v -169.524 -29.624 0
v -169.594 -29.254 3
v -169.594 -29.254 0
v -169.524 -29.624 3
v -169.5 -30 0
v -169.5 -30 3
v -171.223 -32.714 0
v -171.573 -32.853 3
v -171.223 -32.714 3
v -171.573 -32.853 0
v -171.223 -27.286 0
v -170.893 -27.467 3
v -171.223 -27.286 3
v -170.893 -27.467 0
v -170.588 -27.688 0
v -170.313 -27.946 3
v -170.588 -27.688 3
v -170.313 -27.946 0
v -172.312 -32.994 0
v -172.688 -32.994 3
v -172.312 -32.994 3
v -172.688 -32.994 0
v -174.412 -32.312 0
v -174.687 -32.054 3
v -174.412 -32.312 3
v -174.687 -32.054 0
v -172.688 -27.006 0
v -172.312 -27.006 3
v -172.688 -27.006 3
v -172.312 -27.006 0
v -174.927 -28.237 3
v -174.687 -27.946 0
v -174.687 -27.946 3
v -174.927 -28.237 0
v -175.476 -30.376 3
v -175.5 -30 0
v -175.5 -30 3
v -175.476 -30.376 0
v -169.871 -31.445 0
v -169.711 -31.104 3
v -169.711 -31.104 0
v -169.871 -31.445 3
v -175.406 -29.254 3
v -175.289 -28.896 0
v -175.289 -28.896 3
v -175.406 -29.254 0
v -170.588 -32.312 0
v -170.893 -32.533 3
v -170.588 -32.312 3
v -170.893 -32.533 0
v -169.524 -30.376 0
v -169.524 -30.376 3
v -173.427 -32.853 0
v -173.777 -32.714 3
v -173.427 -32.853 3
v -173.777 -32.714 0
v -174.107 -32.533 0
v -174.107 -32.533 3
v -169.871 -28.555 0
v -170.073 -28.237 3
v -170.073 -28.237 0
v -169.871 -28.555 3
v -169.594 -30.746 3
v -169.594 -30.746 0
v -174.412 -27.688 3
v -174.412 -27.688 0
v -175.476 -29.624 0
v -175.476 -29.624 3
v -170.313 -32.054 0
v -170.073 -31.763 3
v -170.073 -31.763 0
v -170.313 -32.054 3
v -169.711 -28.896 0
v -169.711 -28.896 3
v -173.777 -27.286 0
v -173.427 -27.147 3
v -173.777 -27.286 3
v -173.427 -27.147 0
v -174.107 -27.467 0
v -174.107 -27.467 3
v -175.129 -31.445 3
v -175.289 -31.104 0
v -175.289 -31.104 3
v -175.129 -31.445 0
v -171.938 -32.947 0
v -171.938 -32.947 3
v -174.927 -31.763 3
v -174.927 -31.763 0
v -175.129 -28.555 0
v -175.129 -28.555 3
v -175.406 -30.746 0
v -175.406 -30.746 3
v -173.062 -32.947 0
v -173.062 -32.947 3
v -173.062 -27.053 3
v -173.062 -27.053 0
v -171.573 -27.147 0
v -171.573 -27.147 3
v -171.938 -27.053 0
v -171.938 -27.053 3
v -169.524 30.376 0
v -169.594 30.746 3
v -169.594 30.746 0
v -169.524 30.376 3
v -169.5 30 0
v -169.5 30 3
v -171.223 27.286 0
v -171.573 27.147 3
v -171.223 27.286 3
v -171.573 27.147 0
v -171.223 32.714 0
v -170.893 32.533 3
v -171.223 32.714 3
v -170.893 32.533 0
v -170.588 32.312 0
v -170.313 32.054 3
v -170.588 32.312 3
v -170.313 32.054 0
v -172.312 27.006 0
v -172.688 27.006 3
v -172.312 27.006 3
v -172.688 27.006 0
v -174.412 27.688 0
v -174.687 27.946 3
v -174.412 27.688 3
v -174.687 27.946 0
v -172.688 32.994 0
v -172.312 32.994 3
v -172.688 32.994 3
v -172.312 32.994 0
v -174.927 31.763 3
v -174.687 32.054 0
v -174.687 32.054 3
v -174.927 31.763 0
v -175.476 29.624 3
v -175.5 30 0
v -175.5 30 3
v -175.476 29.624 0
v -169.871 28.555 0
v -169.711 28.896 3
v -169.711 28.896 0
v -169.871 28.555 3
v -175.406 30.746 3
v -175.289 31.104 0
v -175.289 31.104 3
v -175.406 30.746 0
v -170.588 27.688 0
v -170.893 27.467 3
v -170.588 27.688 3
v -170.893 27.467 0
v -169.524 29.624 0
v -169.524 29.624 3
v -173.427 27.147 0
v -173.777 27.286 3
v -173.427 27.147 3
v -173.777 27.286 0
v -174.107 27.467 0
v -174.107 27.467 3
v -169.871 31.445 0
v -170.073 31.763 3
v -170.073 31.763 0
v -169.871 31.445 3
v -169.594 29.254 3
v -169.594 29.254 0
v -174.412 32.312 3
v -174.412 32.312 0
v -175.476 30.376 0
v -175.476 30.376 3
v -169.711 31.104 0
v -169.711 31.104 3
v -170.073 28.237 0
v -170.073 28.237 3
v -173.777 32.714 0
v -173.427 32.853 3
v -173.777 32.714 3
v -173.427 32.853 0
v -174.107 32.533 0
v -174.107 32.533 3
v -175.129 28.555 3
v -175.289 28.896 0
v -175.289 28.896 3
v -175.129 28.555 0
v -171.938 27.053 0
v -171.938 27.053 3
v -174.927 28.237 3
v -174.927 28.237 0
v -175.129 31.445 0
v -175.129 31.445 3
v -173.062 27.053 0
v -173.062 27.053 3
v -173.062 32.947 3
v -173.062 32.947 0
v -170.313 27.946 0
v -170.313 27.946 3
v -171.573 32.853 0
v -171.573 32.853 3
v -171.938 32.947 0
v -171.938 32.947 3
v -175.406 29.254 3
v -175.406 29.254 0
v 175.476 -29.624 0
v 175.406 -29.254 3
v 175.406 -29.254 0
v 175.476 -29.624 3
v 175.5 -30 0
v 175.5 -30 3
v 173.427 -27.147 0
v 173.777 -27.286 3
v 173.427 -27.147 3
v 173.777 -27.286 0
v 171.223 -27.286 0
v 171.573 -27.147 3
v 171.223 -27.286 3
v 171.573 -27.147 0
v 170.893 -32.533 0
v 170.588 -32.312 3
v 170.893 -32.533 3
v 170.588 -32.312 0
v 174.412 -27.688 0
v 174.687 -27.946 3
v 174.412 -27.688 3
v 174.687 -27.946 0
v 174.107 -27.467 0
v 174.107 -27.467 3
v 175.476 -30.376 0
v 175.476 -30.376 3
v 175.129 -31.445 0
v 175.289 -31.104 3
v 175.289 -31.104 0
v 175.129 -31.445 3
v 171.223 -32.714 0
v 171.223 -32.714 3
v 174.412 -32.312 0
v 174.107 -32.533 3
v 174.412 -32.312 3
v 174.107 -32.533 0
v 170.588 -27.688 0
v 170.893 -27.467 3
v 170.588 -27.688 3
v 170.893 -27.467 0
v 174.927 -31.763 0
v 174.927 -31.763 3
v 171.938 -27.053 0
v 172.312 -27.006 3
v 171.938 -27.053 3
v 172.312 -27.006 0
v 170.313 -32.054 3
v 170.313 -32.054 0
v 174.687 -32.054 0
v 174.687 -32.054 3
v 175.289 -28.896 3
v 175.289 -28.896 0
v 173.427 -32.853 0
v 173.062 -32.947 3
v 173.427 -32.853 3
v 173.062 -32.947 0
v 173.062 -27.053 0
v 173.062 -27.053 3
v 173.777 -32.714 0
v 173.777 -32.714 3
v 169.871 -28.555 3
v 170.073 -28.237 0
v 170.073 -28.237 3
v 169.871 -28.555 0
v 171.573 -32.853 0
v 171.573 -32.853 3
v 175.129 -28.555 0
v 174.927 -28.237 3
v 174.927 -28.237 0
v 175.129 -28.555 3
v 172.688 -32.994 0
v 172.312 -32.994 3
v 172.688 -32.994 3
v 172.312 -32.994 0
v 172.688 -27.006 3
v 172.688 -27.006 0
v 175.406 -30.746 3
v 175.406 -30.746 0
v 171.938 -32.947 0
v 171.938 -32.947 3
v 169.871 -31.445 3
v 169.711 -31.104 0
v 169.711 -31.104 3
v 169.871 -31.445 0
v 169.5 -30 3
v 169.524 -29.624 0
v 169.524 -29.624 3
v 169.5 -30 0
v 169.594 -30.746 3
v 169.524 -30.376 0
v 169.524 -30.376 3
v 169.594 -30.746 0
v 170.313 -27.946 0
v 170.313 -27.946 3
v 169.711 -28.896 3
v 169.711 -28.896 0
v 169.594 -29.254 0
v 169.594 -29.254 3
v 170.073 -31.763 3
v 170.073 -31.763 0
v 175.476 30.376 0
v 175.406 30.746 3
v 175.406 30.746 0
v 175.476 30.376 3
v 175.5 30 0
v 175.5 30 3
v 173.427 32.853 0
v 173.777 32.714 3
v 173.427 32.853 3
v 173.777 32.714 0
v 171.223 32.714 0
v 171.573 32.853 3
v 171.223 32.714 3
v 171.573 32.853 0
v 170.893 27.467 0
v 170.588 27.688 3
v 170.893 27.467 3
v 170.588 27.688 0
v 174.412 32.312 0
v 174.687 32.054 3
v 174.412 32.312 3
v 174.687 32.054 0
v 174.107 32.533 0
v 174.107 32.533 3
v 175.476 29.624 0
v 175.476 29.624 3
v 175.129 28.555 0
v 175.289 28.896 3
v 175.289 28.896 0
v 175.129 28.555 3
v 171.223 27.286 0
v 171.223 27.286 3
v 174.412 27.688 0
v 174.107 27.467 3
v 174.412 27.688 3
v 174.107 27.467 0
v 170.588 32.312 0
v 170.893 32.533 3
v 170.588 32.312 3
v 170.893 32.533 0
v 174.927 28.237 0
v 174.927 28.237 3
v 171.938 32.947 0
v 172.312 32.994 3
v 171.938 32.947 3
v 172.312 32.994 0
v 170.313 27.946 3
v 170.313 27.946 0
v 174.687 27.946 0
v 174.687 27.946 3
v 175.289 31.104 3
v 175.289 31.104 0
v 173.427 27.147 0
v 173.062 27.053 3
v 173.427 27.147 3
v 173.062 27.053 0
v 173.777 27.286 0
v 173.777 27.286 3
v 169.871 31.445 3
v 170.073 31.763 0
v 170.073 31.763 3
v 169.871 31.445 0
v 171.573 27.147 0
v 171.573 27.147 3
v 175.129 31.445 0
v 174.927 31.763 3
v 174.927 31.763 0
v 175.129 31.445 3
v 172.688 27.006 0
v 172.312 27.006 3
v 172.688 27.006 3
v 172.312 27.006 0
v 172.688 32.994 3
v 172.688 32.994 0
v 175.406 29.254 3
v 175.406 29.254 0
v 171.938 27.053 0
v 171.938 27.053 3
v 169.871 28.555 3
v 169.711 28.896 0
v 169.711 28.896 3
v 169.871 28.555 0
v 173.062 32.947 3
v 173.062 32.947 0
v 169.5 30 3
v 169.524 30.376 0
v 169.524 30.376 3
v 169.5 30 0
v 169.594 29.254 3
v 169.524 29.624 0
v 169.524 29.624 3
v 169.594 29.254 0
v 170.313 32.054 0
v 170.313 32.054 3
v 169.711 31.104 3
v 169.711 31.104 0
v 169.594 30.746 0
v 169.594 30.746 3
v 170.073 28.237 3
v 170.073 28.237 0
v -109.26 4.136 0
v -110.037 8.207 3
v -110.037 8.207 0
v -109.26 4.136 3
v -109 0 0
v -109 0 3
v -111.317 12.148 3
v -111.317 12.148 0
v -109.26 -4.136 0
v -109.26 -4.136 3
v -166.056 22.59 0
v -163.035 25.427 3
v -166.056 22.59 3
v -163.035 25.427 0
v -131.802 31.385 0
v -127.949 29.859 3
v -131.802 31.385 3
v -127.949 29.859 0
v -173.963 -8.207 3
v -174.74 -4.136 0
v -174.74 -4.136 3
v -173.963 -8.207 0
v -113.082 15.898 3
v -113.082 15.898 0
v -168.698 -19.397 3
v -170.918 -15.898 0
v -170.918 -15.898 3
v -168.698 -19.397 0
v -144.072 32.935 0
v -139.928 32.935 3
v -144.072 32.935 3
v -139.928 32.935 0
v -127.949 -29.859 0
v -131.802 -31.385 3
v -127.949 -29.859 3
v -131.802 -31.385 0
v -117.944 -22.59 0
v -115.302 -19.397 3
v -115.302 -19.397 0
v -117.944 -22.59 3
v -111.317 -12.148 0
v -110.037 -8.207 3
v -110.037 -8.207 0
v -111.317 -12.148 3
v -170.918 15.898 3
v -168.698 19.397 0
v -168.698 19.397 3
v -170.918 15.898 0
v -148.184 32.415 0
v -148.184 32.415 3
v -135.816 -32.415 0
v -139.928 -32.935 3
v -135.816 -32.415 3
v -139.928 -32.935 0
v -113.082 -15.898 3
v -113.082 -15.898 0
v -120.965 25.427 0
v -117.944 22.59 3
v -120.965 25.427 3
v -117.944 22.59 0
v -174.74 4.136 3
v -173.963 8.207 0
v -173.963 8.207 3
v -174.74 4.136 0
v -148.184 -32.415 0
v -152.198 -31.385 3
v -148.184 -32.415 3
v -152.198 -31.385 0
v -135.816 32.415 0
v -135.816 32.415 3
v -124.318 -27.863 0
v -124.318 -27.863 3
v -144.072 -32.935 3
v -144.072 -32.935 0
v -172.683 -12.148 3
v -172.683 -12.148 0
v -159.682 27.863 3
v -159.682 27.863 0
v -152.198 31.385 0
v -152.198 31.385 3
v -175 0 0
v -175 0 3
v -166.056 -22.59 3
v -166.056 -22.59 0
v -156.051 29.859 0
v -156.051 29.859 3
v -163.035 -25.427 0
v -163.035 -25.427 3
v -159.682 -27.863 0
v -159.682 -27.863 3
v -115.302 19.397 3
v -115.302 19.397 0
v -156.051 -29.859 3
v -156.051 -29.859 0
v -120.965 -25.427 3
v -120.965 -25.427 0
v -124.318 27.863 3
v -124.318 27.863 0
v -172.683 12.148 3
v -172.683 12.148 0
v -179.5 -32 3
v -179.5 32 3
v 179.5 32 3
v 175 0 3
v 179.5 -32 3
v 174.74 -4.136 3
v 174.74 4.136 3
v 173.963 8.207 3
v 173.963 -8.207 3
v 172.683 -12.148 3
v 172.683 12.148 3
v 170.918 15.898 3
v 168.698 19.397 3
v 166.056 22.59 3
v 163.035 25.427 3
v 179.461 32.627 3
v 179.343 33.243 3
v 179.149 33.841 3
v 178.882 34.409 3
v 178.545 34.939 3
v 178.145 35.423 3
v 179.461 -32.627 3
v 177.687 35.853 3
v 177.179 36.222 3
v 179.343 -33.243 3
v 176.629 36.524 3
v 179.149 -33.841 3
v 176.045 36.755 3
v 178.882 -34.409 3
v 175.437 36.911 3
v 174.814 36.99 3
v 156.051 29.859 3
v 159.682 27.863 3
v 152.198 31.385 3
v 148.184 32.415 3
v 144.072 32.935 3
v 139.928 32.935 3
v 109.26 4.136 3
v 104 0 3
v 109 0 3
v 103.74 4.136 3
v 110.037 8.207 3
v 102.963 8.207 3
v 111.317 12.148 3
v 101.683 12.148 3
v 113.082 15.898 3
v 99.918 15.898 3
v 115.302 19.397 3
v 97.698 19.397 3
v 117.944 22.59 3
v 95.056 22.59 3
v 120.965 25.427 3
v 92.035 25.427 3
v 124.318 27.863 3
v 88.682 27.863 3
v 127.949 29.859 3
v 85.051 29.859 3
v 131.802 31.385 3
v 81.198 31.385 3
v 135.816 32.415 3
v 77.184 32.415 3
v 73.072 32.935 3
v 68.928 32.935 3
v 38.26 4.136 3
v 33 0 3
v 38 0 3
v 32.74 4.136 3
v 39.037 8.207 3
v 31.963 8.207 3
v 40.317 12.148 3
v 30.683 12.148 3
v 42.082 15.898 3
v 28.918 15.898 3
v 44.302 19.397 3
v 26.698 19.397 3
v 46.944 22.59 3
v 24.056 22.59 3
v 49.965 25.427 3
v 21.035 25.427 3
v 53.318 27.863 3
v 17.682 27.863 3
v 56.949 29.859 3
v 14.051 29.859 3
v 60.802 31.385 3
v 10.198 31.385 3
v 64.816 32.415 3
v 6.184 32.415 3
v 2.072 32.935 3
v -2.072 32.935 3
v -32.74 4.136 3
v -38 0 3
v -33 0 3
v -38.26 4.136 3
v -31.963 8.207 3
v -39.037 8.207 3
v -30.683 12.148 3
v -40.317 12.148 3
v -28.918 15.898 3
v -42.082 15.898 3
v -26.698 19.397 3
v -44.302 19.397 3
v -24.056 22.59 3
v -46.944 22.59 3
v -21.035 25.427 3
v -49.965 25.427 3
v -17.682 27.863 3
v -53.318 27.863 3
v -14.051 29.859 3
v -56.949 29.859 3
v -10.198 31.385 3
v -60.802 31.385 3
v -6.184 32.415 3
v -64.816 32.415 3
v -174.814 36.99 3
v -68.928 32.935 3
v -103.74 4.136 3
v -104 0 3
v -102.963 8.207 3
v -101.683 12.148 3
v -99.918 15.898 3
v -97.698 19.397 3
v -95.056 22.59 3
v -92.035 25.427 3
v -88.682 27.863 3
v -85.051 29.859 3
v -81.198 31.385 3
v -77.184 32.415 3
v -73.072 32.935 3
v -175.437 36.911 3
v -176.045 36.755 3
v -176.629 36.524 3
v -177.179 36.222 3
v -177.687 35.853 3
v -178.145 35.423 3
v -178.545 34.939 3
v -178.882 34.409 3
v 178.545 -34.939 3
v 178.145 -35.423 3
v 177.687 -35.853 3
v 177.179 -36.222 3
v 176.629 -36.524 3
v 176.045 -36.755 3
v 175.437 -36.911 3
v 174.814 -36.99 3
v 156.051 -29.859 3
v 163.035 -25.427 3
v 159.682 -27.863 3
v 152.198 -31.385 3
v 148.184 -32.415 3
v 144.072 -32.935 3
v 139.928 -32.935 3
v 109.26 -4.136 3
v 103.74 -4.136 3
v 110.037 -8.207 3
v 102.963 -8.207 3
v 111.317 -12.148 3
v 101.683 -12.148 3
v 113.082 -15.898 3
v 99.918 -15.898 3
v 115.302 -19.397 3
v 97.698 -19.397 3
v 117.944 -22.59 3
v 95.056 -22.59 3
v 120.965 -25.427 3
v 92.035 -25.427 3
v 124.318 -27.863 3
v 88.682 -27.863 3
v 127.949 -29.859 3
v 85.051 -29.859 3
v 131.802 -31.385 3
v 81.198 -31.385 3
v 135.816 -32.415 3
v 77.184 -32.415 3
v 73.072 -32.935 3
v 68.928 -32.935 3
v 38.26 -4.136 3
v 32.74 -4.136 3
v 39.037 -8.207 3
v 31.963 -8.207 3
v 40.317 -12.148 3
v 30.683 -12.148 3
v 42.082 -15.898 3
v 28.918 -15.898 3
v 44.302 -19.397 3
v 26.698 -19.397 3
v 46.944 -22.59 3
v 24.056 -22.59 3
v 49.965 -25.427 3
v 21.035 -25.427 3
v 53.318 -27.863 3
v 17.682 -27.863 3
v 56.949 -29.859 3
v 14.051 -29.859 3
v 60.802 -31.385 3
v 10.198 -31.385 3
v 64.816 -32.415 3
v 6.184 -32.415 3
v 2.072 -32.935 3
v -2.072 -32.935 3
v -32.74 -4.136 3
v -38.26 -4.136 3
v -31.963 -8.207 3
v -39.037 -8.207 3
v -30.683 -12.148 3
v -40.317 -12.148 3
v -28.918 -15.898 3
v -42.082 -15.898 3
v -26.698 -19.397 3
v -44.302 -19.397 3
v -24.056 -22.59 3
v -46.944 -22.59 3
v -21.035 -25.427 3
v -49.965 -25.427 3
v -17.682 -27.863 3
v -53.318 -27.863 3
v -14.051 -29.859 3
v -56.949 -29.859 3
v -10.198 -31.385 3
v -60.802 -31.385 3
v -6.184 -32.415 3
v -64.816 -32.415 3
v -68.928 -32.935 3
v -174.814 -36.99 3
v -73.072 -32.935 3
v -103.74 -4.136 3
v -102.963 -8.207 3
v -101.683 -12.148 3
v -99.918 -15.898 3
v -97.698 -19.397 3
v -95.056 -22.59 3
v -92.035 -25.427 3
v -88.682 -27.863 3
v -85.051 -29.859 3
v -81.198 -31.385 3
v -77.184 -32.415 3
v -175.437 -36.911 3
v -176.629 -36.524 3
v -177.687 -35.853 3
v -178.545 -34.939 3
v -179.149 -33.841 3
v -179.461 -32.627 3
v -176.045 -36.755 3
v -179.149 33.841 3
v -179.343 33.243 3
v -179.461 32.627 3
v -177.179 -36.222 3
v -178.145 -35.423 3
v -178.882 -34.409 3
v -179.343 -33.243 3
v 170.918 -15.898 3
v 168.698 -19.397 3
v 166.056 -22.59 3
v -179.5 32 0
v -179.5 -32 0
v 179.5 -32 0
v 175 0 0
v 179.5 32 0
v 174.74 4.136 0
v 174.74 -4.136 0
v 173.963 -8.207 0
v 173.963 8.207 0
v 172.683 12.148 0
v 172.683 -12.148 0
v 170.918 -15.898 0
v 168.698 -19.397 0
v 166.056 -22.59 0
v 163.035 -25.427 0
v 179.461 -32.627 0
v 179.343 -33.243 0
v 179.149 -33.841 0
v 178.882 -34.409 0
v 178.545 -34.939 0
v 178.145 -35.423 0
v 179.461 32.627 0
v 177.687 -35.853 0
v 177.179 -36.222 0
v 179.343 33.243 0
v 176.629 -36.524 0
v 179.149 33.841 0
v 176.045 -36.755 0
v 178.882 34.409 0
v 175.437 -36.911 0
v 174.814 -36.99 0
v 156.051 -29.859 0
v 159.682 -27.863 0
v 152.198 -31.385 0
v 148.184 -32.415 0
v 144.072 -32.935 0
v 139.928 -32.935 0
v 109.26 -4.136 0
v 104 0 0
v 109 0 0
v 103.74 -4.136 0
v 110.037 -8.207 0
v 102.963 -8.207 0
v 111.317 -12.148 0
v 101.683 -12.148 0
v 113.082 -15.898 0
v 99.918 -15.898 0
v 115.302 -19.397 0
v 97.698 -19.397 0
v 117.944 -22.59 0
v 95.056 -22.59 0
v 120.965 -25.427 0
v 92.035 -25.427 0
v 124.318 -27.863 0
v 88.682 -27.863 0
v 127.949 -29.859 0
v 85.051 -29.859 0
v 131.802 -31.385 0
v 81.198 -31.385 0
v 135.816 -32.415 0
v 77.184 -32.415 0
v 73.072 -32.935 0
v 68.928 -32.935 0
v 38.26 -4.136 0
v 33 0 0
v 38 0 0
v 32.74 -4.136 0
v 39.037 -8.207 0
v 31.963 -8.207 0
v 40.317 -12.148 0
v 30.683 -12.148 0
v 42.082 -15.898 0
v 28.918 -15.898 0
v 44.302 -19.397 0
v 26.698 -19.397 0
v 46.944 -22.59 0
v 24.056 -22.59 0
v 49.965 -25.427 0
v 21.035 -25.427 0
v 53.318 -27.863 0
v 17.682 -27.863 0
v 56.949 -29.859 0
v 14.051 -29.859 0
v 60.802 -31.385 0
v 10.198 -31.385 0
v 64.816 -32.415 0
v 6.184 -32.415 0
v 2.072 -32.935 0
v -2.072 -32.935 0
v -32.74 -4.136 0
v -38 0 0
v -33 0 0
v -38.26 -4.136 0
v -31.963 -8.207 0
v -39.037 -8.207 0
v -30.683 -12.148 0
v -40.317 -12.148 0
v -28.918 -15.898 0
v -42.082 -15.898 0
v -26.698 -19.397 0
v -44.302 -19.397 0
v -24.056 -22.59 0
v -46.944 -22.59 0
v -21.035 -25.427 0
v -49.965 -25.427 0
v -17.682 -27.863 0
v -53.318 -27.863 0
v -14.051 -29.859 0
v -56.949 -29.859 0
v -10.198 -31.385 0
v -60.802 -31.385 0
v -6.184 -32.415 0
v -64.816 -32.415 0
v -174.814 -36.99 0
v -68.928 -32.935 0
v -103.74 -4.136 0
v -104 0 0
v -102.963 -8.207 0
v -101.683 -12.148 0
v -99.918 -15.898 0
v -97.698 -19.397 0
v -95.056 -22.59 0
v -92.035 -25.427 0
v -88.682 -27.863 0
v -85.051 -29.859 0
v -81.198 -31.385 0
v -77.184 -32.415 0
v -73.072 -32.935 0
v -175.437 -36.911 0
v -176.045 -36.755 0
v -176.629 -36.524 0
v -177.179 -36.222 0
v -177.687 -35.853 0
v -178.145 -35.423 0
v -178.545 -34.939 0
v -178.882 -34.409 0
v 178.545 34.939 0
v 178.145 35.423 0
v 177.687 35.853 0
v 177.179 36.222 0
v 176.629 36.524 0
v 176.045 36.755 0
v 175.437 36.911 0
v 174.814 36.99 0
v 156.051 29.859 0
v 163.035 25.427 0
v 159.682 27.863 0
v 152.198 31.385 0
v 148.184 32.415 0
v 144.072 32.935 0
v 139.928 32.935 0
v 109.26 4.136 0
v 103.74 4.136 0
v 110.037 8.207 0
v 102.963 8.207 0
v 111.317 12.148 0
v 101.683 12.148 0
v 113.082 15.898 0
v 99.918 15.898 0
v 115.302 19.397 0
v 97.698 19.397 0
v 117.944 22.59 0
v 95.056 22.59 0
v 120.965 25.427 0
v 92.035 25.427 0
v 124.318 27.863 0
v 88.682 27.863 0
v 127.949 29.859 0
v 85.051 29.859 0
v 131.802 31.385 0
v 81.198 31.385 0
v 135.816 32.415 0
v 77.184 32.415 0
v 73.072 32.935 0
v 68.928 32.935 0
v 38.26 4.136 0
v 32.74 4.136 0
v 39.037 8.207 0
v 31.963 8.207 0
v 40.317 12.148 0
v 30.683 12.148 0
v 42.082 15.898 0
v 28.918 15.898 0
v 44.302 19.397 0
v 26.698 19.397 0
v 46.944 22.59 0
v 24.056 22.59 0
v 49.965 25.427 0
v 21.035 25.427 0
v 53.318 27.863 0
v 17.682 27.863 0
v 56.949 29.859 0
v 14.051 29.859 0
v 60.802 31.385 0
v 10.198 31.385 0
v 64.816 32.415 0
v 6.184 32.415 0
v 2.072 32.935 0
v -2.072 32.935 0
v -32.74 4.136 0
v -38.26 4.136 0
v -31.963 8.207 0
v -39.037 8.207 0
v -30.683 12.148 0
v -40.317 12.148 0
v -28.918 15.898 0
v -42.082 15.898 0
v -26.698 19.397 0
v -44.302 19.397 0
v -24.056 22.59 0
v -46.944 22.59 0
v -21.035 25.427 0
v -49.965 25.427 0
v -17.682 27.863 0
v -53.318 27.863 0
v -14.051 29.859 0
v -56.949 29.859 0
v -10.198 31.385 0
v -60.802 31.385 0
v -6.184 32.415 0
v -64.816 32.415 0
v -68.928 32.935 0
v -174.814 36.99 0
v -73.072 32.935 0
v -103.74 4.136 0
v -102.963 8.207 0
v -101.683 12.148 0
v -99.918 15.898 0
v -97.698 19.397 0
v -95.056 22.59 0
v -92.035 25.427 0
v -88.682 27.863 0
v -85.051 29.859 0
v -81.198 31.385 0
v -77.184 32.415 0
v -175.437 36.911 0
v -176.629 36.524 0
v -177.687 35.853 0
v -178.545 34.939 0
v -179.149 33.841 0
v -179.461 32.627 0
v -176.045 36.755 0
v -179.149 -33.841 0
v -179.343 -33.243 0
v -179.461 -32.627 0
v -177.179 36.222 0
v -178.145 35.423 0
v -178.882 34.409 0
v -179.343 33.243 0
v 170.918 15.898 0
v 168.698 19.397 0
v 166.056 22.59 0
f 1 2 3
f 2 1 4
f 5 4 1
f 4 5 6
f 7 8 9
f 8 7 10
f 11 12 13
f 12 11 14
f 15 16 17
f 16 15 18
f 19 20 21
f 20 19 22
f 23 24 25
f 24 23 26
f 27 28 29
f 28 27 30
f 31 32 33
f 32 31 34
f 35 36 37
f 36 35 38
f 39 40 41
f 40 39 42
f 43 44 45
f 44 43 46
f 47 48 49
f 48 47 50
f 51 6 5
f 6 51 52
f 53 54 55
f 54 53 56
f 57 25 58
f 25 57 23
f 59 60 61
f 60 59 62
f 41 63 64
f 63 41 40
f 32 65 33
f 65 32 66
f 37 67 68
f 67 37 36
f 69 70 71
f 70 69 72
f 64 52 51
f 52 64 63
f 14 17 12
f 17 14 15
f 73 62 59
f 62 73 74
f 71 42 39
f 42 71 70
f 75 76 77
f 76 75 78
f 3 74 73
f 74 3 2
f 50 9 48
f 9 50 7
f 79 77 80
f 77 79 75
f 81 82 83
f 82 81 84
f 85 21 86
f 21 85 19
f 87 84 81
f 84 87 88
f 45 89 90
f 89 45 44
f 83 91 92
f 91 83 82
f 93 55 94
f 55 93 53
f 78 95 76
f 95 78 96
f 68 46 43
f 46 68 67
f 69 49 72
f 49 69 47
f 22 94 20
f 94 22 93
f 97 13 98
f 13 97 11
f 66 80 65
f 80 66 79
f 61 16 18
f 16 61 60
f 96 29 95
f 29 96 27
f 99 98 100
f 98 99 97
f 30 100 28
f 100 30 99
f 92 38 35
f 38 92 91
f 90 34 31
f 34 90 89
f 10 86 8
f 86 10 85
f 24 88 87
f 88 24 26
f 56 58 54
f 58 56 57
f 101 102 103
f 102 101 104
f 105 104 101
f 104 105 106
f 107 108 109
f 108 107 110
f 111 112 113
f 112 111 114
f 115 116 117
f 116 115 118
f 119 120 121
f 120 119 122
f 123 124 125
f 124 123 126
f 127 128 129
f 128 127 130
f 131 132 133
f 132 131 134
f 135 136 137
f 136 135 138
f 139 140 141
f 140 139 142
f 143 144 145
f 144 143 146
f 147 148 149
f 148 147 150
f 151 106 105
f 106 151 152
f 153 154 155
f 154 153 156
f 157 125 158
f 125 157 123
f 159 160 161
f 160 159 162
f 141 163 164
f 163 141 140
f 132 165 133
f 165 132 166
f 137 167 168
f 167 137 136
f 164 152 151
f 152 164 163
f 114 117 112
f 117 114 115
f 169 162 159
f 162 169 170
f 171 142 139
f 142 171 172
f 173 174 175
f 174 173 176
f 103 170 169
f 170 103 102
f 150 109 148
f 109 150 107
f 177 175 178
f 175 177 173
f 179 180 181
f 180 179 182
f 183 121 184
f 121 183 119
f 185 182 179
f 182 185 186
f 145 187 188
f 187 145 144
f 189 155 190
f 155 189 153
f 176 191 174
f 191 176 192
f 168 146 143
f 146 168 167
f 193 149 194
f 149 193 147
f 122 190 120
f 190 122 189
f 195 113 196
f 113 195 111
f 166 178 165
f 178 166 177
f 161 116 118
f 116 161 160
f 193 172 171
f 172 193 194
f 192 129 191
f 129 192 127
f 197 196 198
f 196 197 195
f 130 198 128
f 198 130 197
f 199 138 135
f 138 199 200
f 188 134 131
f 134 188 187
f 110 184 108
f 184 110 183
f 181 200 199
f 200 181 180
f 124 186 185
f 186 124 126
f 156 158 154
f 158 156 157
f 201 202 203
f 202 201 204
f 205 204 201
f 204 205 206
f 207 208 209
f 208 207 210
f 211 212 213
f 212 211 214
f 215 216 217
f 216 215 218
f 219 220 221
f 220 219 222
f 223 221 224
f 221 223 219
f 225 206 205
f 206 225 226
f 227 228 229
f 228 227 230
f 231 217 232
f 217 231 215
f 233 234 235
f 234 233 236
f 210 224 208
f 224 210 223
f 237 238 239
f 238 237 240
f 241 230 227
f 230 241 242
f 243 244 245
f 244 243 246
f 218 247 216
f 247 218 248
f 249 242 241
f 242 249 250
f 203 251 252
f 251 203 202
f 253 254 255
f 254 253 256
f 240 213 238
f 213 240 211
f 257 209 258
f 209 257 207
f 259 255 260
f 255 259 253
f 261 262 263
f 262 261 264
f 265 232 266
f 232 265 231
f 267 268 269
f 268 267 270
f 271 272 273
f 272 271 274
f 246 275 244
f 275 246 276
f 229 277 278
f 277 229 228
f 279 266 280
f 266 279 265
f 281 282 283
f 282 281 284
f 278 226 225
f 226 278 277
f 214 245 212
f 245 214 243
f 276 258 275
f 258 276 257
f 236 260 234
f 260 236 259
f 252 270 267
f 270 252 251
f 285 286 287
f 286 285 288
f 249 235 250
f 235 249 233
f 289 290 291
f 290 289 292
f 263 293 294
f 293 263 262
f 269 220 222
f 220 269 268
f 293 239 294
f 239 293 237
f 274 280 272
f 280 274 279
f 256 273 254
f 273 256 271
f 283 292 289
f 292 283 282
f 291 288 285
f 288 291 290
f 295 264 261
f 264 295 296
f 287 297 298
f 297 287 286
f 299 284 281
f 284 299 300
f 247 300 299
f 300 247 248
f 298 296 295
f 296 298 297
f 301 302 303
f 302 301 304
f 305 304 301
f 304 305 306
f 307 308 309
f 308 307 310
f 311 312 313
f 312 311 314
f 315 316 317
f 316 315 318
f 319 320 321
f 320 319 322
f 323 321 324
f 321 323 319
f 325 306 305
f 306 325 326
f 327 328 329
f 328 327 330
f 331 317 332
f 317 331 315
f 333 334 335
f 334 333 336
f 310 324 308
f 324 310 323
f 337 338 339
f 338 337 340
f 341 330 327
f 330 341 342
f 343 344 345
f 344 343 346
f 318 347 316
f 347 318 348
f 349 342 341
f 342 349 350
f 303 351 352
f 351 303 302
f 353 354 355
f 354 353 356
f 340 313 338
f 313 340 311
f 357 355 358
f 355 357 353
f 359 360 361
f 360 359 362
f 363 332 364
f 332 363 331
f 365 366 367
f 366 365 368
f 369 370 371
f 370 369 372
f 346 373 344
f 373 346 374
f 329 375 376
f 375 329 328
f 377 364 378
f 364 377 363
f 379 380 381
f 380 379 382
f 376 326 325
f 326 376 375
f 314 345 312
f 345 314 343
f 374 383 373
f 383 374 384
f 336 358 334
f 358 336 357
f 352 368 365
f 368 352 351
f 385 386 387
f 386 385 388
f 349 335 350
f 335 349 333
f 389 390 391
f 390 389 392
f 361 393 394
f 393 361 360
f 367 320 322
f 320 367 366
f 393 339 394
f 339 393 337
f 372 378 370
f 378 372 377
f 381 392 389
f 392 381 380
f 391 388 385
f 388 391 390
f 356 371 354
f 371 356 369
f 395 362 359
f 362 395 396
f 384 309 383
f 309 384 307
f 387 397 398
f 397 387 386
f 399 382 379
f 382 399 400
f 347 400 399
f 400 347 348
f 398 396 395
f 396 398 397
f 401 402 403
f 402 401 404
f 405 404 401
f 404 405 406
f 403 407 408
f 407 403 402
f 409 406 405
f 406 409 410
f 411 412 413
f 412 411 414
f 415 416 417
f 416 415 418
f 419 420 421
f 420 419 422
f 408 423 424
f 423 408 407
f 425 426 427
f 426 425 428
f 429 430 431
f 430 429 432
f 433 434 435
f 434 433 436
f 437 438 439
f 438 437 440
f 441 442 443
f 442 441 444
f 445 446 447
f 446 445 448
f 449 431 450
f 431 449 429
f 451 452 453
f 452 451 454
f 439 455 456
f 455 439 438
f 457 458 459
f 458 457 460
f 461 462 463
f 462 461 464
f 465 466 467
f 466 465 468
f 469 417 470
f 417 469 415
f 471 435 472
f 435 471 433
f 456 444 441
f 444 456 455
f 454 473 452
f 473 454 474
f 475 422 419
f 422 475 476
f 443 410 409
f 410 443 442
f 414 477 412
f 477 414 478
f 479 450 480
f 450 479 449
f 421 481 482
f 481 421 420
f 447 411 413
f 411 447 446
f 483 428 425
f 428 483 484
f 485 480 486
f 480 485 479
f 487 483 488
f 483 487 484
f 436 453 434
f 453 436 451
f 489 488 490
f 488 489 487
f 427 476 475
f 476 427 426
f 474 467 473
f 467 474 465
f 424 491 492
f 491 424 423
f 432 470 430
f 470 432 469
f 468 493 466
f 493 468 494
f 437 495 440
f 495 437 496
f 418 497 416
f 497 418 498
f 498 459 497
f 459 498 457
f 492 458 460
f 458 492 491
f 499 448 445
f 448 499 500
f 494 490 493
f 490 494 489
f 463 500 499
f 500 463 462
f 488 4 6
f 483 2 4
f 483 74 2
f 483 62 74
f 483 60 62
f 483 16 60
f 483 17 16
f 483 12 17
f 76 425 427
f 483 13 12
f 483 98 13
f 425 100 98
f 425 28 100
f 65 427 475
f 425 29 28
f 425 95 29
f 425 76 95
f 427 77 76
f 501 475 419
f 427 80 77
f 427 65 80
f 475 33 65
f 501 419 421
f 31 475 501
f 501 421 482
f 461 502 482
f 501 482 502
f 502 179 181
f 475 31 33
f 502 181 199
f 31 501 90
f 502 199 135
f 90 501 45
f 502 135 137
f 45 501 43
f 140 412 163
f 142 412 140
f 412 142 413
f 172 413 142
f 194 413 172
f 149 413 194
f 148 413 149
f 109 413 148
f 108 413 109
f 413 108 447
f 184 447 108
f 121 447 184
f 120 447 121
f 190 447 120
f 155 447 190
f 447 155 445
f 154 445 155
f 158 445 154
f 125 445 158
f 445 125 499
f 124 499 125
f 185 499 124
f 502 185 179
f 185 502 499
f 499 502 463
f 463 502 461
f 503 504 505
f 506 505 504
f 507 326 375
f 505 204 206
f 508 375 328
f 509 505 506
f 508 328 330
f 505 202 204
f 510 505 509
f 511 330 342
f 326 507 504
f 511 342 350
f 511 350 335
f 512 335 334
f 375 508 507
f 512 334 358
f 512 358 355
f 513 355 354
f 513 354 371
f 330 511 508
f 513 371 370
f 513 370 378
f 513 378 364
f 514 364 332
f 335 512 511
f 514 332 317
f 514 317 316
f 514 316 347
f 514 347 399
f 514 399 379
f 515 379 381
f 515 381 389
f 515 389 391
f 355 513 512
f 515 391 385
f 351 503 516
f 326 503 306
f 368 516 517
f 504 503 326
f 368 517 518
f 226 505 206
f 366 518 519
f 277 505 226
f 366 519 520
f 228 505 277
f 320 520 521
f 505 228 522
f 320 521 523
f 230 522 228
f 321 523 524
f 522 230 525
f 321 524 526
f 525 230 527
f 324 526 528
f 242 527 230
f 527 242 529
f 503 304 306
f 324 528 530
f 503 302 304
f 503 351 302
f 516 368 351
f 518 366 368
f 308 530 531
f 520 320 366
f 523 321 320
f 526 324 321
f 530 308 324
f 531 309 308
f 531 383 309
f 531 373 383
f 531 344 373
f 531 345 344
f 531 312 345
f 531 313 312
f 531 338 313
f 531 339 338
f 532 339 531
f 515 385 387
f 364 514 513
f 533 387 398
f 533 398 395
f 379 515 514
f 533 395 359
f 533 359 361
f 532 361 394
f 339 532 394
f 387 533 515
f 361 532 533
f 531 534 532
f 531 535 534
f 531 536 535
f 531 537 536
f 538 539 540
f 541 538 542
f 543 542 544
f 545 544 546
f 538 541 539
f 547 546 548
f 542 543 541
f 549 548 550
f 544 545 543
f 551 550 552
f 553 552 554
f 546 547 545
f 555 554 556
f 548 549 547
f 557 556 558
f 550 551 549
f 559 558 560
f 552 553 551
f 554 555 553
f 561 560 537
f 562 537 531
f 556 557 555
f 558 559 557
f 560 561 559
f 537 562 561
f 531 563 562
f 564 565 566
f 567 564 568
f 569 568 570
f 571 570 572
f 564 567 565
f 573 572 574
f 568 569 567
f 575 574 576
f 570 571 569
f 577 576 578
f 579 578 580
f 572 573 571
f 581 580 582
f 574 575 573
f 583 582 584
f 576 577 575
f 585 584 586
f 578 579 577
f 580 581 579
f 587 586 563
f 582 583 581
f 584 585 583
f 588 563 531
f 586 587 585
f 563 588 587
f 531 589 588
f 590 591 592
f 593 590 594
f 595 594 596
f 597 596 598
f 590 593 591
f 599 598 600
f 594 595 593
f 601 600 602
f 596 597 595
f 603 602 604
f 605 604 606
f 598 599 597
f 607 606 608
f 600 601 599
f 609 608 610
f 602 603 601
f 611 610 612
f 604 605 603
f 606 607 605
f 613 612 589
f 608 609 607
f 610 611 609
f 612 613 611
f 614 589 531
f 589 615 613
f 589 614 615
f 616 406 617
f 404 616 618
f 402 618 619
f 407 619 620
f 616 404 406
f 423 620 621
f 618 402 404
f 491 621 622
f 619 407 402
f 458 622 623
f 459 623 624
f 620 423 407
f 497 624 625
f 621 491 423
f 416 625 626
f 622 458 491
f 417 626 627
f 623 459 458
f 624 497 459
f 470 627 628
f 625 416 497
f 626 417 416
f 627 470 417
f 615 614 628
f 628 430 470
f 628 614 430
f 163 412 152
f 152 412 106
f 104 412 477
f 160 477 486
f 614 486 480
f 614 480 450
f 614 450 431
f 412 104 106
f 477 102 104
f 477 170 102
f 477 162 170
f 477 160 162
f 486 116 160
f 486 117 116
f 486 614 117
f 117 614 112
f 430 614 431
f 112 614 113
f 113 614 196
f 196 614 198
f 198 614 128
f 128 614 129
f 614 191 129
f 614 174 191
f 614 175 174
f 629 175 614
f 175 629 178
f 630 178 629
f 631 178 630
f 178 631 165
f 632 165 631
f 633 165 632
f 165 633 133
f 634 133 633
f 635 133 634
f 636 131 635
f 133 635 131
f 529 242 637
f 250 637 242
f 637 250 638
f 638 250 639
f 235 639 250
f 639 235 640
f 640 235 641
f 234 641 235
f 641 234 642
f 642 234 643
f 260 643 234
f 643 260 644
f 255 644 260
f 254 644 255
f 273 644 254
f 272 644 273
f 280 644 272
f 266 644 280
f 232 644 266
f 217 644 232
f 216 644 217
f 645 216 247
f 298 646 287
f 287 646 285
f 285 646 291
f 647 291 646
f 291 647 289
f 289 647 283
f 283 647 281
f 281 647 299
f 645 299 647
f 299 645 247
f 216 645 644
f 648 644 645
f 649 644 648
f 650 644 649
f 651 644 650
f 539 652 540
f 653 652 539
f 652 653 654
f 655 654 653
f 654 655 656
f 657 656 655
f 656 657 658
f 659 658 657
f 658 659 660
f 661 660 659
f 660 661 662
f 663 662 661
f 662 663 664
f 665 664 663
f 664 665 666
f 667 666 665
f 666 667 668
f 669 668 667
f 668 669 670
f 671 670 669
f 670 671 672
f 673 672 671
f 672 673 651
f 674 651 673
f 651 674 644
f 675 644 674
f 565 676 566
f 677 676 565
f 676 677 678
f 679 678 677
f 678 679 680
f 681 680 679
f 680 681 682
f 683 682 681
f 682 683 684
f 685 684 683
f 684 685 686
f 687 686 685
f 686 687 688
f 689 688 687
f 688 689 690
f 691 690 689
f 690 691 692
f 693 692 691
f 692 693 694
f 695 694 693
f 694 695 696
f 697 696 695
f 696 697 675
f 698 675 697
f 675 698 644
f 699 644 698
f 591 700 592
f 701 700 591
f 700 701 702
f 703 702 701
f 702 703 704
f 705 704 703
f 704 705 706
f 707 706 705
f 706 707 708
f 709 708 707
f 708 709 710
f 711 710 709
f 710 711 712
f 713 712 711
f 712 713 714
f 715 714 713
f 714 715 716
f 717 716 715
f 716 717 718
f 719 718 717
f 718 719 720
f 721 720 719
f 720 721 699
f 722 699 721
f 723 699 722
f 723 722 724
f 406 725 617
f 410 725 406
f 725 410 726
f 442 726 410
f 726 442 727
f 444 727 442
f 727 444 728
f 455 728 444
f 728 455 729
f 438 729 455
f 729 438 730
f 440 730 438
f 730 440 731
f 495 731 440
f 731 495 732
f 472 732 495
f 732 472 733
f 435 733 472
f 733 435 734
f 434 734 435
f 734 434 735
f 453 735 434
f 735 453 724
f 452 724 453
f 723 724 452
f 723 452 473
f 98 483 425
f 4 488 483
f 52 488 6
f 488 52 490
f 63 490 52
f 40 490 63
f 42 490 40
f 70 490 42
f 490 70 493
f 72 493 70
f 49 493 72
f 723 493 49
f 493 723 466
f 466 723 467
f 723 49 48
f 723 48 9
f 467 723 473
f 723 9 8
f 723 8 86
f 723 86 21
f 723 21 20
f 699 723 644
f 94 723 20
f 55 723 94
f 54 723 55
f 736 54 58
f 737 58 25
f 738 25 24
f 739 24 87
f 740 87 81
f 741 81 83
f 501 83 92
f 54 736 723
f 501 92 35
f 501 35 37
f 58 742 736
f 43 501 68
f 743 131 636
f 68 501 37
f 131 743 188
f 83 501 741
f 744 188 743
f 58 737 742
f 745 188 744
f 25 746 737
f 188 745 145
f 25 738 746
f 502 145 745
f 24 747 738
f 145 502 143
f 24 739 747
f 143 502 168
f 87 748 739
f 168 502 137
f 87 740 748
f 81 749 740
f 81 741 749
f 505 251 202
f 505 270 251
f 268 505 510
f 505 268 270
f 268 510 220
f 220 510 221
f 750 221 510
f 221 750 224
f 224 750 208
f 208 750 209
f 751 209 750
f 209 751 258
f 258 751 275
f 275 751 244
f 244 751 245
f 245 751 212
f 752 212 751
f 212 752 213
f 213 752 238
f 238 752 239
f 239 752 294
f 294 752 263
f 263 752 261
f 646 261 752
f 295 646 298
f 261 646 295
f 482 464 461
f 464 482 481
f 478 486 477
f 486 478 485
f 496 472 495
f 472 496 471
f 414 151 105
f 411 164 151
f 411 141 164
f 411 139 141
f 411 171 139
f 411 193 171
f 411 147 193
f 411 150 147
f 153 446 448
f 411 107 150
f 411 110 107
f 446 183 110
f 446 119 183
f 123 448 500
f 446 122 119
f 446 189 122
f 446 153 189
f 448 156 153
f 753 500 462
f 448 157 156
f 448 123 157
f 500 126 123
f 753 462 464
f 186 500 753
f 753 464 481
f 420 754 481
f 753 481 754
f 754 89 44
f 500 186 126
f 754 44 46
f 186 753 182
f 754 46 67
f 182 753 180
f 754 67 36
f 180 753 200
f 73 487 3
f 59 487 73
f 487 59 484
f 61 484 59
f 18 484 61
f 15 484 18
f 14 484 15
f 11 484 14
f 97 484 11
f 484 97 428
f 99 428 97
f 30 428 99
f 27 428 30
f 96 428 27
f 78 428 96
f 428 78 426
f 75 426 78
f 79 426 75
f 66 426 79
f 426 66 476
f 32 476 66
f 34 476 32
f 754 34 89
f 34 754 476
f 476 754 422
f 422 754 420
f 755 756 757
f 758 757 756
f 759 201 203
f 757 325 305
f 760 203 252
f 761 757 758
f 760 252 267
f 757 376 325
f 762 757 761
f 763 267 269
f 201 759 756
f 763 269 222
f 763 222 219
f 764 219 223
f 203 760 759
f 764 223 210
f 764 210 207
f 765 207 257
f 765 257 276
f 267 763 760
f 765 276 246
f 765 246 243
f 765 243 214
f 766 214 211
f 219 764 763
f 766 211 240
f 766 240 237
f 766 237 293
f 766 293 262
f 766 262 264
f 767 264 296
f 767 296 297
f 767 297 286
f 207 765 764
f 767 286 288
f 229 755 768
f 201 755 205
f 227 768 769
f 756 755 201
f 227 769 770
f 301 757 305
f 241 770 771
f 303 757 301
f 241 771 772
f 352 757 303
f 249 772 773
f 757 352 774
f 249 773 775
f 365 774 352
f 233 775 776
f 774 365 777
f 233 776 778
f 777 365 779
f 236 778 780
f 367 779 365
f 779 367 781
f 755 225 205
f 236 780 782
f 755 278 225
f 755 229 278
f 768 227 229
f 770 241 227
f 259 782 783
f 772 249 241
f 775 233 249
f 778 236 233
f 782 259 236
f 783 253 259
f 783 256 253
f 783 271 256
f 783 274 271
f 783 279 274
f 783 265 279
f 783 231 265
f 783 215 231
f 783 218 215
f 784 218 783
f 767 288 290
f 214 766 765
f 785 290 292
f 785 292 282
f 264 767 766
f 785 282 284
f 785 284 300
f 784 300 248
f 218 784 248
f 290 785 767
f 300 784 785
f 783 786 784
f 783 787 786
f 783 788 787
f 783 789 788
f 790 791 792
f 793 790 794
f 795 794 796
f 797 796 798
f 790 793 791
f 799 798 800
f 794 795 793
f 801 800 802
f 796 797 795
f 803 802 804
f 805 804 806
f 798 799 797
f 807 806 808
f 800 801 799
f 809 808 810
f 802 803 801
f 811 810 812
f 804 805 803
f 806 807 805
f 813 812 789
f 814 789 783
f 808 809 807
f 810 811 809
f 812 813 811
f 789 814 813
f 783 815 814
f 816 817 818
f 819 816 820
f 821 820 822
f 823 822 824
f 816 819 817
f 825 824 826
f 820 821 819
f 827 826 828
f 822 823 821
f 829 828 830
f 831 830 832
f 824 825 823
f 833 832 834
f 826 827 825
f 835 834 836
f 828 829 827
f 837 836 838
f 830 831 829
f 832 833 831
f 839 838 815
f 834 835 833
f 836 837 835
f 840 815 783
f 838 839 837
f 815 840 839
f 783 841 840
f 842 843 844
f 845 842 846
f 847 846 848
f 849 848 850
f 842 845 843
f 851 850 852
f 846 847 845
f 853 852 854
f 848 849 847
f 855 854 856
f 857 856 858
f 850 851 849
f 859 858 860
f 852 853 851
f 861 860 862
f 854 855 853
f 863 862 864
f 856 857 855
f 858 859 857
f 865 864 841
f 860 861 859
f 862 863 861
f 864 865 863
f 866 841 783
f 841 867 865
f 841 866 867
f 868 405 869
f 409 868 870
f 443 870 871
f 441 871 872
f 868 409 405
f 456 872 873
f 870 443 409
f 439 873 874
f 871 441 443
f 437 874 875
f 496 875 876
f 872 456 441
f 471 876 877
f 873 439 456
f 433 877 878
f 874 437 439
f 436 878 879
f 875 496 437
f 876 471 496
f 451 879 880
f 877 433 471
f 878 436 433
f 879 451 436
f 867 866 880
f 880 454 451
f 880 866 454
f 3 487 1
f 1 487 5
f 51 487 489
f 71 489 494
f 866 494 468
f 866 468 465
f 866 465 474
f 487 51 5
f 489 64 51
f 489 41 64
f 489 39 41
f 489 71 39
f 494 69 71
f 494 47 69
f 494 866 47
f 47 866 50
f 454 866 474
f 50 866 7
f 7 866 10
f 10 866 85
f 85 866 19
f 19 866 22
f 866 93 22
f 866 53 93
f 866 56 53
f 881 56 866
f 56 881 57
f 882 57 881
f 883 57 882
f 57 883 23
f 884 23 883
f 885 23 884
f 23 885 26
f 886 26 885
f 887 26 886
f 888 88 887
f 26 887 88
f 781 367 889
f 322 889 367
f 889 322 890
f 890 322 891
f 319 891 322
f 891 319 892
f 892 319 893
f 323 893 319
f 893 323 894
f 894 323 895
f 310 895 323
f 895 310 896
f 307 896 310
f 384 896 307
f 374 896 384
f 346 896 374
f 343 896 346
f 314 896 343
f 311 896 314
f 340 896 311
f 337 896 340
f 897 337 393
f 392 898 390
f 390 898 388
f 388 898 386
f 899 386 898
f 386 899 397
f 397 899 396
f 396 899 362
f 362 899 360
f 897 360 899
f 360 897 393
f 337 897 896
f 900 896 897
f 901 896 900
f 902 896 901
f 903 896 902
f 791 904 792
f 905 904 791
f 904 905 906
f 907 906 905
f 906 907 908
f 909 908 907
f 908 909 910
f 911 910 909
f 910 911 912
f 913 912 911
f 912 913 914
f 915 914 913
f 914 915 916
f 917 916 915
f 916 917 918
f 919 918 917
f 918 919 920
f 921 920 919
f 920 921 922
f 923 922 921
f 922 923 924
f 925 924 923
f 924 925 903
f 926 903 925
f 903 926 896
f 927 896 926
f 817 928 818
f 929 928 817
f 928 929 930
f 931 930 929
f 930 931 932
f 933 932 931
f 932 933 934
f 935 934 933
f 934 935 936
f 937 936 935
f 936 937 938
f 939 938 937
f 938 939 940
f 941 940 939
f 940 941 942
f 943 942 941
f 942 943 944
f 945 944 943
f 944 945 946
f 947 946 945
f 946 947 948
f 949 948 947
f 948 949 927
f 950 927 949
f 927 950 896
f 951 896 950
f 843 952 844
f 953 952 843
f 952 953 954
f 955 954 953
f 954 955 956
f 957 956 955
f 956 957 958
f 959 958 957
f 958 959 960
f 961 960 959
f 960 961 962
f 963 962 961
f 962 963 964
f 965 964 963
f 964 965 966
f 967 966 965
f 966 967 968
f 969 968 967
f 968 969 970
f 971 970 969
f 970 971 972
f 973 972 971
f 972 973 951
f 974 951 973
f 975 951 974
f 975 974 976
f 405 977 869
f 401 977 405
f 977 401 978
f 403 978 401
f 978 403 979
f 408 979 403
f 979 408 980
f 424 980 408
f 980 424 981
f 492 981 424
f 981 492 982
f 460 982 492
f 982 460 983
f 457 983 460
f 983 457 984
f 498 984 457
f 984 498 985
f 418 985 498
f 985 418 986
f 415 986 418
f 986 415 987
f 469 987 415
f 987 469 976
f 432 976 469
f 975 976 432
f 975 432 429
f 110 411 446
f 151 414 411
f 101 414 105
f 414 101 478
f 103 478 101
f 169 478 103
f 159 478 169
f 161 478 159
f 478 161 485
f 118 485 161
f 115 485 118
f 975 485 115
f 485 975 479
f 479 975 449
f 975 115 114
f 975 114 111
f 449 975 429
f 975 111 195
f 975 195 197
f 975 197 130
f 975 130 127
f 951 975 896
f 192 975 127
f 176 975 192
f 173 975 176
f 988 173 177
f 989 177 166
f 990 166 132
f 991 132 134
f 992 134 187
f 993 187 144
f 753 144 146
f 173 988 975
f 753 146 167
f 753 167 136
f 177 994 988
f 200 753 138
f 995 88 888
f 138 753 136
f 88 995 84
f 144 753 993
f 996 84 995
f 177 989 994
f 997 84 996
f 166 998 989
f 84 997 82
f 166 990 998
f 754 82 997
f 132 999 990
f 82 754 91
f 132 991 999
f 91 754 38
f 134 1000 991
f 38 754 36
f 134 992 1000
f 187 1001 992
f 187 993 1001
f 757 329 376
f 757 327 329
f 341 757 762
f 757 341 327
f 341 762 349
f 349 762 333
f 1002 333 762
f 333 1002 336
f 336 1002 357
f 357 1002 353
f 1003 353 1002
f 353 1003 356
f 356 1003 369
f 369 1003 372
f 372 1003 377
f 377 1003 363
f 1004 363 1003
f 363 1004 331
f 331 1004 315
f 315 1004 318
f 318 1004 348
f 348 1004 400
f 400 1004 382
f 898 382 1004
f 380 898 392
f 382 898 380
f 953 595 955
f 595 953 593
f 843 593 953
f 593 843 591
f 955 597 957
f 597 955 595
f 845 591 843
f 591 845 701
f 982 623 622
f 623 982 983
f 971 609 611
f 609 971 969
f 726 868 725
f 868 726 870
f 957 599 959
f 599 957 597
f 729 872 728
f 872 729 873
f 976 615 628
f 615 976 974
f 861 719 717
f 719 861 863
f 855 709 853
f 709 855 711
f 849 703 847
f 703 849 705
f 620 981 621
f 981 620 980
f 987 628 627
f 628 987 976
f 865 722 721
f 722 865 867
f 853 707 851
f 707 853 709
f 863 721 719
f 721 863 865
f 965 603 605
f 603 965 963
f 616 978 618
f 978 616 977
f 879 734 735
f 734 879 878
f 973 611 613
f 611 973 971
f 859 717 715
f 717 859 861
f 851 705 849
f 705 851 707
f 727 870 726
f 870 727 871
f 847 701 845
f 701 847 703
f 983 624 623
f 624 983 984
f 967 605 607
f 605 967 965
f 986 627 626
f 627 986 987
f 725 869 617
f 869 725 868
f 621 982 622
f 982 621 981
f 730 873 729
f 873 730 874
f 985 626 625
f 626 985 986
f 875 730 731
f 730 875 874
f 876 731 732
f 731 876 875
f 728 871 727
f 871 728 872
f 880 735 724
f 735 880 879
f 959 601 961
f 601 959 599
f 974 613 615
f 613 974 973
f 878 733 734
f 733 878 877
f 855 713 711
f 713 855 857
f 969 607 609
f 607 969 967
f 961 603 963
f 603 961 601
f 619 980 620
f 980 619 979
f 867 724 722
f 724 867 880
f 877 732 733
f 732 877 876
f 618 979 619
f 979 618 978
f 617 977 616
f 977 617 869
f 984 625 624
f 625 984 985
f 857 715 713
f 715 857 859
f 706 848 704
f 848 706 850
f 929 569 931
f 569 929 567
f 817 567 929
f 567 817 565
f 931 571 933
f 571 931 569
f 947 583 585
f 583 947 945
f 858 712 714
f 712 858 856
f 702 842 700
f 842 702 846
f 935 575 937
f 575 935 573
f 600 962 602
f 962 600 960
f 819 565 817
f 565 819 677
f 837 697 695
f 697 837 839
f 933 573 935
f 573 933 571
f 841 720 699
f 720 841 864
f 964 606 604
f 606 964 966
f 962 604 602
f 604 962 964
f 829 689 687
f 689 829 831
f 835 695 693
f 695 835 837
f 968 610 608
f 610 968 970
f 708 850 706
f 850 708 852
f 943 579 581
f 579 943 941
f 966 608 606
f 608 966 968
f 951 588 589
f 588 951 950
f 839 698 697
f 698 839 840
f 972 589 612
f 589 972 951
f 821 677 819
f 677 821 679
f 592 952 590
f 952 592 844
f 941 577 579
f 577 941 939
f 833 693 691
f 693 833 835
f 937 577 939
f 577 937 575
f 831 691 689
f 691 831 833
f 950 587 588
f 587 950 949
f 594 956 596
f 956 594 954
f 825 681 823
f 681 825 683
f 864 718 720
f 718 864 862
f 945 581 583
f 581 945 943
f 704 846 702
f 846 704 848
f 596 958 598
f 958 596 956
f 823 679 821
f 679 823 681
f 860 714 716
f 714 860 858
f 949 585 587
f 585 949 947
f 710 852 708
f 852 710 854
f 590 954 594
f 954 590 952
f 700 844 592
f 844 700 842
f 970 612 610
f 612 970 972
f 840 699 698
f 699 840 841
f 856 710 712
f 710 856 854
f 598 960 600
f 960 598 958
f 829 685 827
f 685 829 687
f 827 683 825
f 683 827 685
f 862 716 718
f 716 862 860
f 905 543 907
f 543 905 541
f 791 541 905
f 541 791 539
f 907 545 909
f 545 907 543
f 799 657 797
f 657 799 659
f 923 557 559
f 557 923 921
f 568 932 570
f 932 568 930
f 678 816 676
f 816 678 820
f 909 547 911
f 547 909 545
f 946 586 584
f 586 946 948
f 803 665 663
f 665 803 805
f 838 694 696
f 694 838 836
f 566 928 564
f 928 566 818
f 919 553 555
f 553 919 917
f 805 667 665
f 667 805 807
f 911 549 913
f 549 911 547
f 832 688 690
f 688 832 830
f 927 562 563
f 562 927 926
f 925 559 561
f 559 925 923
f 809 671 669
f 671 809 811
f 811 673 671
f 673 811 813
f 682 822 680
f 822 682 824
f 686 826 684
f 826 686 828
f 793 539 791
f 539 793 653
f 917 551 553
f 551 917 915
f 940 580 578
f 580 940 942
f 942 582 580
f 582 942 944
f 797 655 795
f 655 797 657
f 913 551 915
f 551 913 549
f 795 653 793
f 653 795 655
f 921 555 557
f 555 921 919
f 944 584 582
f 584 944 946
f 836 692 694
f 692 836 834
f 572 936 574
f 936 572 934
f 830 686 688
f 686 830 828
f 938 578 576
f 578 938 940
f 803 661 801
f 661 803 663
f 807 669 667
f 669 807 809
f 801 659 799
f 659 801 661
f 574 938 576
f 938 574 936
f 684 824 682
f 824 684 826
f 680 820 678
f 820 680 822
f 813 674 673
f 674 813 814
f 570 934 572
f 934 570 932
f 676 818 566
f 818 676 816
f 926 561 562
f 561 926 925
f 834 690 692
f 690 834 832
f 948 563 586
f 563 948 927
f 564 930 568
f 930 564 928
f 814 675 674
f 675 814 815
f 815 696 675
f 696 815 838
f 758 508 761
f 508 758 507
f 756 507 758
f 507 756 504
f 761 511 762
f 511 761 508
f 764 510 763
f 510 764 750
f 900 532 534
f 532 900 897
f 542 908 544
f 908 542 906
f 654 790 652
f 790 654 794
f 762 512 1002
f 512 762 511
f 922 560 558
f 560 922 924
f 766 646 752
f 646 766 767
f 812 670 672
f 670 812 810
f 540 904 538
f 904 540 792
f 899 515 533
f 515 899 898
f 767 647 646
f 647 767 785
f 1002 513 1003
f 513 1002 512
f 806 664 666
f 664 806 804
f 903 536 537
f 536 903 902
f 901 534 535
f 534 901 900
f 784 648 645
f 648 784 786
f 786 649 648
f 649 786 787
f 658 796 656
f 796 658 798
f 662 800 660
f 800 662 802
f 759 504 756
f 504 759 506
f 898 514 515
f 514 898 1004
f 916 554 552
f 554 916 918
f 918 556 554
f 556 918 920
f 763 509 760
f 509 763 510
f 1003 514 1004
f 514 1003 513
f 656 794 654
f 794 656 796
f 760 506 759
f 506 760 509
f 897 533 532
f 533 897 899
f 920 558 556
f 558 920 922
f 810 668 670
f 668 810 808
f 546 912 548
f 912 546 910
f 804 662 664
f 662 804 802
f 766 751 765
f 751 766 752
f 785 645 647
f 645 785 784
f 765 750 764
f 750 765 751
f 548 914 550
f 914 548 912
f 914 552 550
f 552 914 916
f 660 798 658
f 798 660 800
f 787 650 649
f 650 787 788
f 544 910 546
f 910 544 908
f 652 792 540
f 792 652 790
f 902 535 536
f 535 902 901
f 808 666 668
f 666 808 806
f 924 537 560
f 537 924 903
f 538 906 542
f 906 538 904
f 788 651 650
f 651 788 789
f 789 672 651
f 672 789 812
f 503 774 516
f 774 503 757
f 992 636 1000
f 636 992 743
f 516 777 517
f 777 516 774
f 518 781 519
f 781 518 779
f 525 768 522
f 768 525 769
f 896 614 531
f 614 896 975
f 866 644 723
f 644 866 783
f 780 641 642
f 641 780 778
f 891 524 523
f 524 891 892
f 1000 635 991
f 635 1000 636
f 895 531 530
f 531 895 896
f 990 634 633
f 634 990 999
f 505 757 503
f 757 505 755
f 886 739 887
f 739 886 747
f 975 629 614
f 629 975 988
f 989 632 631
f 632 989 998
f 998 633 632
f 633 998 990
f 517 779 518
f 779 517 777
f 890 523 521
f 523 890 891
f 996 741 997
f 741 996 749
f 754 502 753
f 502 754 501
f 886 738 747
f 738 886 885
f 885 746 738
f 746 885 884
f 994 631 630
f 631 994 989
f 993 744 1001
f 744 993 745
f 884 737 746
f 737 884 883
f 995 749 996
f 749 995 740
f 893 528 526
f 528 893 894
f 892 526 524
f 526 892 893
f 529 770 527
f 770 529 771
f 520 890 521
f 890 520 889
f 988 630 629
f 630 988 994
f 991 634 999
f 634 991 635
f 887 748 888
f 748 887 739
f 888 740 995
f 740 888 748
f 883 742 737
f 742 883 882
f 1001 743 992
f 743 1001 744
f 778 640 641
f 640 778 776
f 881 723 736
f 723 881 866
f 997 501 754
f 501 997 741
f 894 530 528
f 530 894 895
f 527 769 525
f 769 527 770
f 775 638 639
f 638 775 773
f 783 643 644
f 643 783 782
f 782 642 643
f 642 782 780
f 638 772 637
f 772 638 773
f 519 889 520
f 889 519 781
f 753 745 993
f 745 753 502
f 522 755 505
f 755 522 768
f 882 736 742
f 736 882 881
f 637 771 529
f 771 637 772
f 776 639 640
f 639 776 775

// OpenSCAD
$fn = 50;


difference() {
	union() {
		hull() {
			translate(v = [-174.5000000000, 32.0000000000, 0]) {
				cylinder(h = 3, r = 5);
			}
			translate(v = [174.5000000000, 32.0000000000, 0]) {
				cylinder(h = 3, r = 5);
			}
			translate(v = [-174.5000000000, -32.0000000000, 0]) {
				cylinder(h = 3, r = 5);
			}
			translate(v = [174.5000000000, -32.0000000000, 0]) {
				cylinder(h = 3, r = 5);
			}
		}
	}
	union() {
		#translate(v = [-172.5000000000, -30.0000000000, -100.0000000000]) {
			cylinder(h = 200, r = 3.0000000000);
		}
		#translate(v = [-172.5000000000, 30.0000000000, -100.0000000000]) {
			cylinder(h = 200, r = 3.0000000000);
		}
		#translate(v = [172.5000000000, -30.0000000000, -100.0000000000]) {
			cylinder(h = 200, r = 3.0000000000);
		}
		#translate(v = [172.5000000000, 30.0000000000, -100.0000000000]) {
			cylinder(h = 200, r = 3.0000000000);
		}
		#translate(v = [-142.0000000000, 0, 0]) {
			cylinder(h = 3, r = 33.0000000000);
		}
		#translate(v = [-71.0000000000, 0, 0]) {
			cylinder(h = 3, r = 33.0000000000);
		}
		#cylinder(h = 3, r = 33.0000000000);
		#translate(v = [71.0000000000, 0, 0]) {
			cylinder(h = 3, r = 33.0000000000);
		}
		#translate(v = [142.0000000000, 0, 0]) {
			cylinder(h = 3, r = 33.0000000000);
		}
	}
}
